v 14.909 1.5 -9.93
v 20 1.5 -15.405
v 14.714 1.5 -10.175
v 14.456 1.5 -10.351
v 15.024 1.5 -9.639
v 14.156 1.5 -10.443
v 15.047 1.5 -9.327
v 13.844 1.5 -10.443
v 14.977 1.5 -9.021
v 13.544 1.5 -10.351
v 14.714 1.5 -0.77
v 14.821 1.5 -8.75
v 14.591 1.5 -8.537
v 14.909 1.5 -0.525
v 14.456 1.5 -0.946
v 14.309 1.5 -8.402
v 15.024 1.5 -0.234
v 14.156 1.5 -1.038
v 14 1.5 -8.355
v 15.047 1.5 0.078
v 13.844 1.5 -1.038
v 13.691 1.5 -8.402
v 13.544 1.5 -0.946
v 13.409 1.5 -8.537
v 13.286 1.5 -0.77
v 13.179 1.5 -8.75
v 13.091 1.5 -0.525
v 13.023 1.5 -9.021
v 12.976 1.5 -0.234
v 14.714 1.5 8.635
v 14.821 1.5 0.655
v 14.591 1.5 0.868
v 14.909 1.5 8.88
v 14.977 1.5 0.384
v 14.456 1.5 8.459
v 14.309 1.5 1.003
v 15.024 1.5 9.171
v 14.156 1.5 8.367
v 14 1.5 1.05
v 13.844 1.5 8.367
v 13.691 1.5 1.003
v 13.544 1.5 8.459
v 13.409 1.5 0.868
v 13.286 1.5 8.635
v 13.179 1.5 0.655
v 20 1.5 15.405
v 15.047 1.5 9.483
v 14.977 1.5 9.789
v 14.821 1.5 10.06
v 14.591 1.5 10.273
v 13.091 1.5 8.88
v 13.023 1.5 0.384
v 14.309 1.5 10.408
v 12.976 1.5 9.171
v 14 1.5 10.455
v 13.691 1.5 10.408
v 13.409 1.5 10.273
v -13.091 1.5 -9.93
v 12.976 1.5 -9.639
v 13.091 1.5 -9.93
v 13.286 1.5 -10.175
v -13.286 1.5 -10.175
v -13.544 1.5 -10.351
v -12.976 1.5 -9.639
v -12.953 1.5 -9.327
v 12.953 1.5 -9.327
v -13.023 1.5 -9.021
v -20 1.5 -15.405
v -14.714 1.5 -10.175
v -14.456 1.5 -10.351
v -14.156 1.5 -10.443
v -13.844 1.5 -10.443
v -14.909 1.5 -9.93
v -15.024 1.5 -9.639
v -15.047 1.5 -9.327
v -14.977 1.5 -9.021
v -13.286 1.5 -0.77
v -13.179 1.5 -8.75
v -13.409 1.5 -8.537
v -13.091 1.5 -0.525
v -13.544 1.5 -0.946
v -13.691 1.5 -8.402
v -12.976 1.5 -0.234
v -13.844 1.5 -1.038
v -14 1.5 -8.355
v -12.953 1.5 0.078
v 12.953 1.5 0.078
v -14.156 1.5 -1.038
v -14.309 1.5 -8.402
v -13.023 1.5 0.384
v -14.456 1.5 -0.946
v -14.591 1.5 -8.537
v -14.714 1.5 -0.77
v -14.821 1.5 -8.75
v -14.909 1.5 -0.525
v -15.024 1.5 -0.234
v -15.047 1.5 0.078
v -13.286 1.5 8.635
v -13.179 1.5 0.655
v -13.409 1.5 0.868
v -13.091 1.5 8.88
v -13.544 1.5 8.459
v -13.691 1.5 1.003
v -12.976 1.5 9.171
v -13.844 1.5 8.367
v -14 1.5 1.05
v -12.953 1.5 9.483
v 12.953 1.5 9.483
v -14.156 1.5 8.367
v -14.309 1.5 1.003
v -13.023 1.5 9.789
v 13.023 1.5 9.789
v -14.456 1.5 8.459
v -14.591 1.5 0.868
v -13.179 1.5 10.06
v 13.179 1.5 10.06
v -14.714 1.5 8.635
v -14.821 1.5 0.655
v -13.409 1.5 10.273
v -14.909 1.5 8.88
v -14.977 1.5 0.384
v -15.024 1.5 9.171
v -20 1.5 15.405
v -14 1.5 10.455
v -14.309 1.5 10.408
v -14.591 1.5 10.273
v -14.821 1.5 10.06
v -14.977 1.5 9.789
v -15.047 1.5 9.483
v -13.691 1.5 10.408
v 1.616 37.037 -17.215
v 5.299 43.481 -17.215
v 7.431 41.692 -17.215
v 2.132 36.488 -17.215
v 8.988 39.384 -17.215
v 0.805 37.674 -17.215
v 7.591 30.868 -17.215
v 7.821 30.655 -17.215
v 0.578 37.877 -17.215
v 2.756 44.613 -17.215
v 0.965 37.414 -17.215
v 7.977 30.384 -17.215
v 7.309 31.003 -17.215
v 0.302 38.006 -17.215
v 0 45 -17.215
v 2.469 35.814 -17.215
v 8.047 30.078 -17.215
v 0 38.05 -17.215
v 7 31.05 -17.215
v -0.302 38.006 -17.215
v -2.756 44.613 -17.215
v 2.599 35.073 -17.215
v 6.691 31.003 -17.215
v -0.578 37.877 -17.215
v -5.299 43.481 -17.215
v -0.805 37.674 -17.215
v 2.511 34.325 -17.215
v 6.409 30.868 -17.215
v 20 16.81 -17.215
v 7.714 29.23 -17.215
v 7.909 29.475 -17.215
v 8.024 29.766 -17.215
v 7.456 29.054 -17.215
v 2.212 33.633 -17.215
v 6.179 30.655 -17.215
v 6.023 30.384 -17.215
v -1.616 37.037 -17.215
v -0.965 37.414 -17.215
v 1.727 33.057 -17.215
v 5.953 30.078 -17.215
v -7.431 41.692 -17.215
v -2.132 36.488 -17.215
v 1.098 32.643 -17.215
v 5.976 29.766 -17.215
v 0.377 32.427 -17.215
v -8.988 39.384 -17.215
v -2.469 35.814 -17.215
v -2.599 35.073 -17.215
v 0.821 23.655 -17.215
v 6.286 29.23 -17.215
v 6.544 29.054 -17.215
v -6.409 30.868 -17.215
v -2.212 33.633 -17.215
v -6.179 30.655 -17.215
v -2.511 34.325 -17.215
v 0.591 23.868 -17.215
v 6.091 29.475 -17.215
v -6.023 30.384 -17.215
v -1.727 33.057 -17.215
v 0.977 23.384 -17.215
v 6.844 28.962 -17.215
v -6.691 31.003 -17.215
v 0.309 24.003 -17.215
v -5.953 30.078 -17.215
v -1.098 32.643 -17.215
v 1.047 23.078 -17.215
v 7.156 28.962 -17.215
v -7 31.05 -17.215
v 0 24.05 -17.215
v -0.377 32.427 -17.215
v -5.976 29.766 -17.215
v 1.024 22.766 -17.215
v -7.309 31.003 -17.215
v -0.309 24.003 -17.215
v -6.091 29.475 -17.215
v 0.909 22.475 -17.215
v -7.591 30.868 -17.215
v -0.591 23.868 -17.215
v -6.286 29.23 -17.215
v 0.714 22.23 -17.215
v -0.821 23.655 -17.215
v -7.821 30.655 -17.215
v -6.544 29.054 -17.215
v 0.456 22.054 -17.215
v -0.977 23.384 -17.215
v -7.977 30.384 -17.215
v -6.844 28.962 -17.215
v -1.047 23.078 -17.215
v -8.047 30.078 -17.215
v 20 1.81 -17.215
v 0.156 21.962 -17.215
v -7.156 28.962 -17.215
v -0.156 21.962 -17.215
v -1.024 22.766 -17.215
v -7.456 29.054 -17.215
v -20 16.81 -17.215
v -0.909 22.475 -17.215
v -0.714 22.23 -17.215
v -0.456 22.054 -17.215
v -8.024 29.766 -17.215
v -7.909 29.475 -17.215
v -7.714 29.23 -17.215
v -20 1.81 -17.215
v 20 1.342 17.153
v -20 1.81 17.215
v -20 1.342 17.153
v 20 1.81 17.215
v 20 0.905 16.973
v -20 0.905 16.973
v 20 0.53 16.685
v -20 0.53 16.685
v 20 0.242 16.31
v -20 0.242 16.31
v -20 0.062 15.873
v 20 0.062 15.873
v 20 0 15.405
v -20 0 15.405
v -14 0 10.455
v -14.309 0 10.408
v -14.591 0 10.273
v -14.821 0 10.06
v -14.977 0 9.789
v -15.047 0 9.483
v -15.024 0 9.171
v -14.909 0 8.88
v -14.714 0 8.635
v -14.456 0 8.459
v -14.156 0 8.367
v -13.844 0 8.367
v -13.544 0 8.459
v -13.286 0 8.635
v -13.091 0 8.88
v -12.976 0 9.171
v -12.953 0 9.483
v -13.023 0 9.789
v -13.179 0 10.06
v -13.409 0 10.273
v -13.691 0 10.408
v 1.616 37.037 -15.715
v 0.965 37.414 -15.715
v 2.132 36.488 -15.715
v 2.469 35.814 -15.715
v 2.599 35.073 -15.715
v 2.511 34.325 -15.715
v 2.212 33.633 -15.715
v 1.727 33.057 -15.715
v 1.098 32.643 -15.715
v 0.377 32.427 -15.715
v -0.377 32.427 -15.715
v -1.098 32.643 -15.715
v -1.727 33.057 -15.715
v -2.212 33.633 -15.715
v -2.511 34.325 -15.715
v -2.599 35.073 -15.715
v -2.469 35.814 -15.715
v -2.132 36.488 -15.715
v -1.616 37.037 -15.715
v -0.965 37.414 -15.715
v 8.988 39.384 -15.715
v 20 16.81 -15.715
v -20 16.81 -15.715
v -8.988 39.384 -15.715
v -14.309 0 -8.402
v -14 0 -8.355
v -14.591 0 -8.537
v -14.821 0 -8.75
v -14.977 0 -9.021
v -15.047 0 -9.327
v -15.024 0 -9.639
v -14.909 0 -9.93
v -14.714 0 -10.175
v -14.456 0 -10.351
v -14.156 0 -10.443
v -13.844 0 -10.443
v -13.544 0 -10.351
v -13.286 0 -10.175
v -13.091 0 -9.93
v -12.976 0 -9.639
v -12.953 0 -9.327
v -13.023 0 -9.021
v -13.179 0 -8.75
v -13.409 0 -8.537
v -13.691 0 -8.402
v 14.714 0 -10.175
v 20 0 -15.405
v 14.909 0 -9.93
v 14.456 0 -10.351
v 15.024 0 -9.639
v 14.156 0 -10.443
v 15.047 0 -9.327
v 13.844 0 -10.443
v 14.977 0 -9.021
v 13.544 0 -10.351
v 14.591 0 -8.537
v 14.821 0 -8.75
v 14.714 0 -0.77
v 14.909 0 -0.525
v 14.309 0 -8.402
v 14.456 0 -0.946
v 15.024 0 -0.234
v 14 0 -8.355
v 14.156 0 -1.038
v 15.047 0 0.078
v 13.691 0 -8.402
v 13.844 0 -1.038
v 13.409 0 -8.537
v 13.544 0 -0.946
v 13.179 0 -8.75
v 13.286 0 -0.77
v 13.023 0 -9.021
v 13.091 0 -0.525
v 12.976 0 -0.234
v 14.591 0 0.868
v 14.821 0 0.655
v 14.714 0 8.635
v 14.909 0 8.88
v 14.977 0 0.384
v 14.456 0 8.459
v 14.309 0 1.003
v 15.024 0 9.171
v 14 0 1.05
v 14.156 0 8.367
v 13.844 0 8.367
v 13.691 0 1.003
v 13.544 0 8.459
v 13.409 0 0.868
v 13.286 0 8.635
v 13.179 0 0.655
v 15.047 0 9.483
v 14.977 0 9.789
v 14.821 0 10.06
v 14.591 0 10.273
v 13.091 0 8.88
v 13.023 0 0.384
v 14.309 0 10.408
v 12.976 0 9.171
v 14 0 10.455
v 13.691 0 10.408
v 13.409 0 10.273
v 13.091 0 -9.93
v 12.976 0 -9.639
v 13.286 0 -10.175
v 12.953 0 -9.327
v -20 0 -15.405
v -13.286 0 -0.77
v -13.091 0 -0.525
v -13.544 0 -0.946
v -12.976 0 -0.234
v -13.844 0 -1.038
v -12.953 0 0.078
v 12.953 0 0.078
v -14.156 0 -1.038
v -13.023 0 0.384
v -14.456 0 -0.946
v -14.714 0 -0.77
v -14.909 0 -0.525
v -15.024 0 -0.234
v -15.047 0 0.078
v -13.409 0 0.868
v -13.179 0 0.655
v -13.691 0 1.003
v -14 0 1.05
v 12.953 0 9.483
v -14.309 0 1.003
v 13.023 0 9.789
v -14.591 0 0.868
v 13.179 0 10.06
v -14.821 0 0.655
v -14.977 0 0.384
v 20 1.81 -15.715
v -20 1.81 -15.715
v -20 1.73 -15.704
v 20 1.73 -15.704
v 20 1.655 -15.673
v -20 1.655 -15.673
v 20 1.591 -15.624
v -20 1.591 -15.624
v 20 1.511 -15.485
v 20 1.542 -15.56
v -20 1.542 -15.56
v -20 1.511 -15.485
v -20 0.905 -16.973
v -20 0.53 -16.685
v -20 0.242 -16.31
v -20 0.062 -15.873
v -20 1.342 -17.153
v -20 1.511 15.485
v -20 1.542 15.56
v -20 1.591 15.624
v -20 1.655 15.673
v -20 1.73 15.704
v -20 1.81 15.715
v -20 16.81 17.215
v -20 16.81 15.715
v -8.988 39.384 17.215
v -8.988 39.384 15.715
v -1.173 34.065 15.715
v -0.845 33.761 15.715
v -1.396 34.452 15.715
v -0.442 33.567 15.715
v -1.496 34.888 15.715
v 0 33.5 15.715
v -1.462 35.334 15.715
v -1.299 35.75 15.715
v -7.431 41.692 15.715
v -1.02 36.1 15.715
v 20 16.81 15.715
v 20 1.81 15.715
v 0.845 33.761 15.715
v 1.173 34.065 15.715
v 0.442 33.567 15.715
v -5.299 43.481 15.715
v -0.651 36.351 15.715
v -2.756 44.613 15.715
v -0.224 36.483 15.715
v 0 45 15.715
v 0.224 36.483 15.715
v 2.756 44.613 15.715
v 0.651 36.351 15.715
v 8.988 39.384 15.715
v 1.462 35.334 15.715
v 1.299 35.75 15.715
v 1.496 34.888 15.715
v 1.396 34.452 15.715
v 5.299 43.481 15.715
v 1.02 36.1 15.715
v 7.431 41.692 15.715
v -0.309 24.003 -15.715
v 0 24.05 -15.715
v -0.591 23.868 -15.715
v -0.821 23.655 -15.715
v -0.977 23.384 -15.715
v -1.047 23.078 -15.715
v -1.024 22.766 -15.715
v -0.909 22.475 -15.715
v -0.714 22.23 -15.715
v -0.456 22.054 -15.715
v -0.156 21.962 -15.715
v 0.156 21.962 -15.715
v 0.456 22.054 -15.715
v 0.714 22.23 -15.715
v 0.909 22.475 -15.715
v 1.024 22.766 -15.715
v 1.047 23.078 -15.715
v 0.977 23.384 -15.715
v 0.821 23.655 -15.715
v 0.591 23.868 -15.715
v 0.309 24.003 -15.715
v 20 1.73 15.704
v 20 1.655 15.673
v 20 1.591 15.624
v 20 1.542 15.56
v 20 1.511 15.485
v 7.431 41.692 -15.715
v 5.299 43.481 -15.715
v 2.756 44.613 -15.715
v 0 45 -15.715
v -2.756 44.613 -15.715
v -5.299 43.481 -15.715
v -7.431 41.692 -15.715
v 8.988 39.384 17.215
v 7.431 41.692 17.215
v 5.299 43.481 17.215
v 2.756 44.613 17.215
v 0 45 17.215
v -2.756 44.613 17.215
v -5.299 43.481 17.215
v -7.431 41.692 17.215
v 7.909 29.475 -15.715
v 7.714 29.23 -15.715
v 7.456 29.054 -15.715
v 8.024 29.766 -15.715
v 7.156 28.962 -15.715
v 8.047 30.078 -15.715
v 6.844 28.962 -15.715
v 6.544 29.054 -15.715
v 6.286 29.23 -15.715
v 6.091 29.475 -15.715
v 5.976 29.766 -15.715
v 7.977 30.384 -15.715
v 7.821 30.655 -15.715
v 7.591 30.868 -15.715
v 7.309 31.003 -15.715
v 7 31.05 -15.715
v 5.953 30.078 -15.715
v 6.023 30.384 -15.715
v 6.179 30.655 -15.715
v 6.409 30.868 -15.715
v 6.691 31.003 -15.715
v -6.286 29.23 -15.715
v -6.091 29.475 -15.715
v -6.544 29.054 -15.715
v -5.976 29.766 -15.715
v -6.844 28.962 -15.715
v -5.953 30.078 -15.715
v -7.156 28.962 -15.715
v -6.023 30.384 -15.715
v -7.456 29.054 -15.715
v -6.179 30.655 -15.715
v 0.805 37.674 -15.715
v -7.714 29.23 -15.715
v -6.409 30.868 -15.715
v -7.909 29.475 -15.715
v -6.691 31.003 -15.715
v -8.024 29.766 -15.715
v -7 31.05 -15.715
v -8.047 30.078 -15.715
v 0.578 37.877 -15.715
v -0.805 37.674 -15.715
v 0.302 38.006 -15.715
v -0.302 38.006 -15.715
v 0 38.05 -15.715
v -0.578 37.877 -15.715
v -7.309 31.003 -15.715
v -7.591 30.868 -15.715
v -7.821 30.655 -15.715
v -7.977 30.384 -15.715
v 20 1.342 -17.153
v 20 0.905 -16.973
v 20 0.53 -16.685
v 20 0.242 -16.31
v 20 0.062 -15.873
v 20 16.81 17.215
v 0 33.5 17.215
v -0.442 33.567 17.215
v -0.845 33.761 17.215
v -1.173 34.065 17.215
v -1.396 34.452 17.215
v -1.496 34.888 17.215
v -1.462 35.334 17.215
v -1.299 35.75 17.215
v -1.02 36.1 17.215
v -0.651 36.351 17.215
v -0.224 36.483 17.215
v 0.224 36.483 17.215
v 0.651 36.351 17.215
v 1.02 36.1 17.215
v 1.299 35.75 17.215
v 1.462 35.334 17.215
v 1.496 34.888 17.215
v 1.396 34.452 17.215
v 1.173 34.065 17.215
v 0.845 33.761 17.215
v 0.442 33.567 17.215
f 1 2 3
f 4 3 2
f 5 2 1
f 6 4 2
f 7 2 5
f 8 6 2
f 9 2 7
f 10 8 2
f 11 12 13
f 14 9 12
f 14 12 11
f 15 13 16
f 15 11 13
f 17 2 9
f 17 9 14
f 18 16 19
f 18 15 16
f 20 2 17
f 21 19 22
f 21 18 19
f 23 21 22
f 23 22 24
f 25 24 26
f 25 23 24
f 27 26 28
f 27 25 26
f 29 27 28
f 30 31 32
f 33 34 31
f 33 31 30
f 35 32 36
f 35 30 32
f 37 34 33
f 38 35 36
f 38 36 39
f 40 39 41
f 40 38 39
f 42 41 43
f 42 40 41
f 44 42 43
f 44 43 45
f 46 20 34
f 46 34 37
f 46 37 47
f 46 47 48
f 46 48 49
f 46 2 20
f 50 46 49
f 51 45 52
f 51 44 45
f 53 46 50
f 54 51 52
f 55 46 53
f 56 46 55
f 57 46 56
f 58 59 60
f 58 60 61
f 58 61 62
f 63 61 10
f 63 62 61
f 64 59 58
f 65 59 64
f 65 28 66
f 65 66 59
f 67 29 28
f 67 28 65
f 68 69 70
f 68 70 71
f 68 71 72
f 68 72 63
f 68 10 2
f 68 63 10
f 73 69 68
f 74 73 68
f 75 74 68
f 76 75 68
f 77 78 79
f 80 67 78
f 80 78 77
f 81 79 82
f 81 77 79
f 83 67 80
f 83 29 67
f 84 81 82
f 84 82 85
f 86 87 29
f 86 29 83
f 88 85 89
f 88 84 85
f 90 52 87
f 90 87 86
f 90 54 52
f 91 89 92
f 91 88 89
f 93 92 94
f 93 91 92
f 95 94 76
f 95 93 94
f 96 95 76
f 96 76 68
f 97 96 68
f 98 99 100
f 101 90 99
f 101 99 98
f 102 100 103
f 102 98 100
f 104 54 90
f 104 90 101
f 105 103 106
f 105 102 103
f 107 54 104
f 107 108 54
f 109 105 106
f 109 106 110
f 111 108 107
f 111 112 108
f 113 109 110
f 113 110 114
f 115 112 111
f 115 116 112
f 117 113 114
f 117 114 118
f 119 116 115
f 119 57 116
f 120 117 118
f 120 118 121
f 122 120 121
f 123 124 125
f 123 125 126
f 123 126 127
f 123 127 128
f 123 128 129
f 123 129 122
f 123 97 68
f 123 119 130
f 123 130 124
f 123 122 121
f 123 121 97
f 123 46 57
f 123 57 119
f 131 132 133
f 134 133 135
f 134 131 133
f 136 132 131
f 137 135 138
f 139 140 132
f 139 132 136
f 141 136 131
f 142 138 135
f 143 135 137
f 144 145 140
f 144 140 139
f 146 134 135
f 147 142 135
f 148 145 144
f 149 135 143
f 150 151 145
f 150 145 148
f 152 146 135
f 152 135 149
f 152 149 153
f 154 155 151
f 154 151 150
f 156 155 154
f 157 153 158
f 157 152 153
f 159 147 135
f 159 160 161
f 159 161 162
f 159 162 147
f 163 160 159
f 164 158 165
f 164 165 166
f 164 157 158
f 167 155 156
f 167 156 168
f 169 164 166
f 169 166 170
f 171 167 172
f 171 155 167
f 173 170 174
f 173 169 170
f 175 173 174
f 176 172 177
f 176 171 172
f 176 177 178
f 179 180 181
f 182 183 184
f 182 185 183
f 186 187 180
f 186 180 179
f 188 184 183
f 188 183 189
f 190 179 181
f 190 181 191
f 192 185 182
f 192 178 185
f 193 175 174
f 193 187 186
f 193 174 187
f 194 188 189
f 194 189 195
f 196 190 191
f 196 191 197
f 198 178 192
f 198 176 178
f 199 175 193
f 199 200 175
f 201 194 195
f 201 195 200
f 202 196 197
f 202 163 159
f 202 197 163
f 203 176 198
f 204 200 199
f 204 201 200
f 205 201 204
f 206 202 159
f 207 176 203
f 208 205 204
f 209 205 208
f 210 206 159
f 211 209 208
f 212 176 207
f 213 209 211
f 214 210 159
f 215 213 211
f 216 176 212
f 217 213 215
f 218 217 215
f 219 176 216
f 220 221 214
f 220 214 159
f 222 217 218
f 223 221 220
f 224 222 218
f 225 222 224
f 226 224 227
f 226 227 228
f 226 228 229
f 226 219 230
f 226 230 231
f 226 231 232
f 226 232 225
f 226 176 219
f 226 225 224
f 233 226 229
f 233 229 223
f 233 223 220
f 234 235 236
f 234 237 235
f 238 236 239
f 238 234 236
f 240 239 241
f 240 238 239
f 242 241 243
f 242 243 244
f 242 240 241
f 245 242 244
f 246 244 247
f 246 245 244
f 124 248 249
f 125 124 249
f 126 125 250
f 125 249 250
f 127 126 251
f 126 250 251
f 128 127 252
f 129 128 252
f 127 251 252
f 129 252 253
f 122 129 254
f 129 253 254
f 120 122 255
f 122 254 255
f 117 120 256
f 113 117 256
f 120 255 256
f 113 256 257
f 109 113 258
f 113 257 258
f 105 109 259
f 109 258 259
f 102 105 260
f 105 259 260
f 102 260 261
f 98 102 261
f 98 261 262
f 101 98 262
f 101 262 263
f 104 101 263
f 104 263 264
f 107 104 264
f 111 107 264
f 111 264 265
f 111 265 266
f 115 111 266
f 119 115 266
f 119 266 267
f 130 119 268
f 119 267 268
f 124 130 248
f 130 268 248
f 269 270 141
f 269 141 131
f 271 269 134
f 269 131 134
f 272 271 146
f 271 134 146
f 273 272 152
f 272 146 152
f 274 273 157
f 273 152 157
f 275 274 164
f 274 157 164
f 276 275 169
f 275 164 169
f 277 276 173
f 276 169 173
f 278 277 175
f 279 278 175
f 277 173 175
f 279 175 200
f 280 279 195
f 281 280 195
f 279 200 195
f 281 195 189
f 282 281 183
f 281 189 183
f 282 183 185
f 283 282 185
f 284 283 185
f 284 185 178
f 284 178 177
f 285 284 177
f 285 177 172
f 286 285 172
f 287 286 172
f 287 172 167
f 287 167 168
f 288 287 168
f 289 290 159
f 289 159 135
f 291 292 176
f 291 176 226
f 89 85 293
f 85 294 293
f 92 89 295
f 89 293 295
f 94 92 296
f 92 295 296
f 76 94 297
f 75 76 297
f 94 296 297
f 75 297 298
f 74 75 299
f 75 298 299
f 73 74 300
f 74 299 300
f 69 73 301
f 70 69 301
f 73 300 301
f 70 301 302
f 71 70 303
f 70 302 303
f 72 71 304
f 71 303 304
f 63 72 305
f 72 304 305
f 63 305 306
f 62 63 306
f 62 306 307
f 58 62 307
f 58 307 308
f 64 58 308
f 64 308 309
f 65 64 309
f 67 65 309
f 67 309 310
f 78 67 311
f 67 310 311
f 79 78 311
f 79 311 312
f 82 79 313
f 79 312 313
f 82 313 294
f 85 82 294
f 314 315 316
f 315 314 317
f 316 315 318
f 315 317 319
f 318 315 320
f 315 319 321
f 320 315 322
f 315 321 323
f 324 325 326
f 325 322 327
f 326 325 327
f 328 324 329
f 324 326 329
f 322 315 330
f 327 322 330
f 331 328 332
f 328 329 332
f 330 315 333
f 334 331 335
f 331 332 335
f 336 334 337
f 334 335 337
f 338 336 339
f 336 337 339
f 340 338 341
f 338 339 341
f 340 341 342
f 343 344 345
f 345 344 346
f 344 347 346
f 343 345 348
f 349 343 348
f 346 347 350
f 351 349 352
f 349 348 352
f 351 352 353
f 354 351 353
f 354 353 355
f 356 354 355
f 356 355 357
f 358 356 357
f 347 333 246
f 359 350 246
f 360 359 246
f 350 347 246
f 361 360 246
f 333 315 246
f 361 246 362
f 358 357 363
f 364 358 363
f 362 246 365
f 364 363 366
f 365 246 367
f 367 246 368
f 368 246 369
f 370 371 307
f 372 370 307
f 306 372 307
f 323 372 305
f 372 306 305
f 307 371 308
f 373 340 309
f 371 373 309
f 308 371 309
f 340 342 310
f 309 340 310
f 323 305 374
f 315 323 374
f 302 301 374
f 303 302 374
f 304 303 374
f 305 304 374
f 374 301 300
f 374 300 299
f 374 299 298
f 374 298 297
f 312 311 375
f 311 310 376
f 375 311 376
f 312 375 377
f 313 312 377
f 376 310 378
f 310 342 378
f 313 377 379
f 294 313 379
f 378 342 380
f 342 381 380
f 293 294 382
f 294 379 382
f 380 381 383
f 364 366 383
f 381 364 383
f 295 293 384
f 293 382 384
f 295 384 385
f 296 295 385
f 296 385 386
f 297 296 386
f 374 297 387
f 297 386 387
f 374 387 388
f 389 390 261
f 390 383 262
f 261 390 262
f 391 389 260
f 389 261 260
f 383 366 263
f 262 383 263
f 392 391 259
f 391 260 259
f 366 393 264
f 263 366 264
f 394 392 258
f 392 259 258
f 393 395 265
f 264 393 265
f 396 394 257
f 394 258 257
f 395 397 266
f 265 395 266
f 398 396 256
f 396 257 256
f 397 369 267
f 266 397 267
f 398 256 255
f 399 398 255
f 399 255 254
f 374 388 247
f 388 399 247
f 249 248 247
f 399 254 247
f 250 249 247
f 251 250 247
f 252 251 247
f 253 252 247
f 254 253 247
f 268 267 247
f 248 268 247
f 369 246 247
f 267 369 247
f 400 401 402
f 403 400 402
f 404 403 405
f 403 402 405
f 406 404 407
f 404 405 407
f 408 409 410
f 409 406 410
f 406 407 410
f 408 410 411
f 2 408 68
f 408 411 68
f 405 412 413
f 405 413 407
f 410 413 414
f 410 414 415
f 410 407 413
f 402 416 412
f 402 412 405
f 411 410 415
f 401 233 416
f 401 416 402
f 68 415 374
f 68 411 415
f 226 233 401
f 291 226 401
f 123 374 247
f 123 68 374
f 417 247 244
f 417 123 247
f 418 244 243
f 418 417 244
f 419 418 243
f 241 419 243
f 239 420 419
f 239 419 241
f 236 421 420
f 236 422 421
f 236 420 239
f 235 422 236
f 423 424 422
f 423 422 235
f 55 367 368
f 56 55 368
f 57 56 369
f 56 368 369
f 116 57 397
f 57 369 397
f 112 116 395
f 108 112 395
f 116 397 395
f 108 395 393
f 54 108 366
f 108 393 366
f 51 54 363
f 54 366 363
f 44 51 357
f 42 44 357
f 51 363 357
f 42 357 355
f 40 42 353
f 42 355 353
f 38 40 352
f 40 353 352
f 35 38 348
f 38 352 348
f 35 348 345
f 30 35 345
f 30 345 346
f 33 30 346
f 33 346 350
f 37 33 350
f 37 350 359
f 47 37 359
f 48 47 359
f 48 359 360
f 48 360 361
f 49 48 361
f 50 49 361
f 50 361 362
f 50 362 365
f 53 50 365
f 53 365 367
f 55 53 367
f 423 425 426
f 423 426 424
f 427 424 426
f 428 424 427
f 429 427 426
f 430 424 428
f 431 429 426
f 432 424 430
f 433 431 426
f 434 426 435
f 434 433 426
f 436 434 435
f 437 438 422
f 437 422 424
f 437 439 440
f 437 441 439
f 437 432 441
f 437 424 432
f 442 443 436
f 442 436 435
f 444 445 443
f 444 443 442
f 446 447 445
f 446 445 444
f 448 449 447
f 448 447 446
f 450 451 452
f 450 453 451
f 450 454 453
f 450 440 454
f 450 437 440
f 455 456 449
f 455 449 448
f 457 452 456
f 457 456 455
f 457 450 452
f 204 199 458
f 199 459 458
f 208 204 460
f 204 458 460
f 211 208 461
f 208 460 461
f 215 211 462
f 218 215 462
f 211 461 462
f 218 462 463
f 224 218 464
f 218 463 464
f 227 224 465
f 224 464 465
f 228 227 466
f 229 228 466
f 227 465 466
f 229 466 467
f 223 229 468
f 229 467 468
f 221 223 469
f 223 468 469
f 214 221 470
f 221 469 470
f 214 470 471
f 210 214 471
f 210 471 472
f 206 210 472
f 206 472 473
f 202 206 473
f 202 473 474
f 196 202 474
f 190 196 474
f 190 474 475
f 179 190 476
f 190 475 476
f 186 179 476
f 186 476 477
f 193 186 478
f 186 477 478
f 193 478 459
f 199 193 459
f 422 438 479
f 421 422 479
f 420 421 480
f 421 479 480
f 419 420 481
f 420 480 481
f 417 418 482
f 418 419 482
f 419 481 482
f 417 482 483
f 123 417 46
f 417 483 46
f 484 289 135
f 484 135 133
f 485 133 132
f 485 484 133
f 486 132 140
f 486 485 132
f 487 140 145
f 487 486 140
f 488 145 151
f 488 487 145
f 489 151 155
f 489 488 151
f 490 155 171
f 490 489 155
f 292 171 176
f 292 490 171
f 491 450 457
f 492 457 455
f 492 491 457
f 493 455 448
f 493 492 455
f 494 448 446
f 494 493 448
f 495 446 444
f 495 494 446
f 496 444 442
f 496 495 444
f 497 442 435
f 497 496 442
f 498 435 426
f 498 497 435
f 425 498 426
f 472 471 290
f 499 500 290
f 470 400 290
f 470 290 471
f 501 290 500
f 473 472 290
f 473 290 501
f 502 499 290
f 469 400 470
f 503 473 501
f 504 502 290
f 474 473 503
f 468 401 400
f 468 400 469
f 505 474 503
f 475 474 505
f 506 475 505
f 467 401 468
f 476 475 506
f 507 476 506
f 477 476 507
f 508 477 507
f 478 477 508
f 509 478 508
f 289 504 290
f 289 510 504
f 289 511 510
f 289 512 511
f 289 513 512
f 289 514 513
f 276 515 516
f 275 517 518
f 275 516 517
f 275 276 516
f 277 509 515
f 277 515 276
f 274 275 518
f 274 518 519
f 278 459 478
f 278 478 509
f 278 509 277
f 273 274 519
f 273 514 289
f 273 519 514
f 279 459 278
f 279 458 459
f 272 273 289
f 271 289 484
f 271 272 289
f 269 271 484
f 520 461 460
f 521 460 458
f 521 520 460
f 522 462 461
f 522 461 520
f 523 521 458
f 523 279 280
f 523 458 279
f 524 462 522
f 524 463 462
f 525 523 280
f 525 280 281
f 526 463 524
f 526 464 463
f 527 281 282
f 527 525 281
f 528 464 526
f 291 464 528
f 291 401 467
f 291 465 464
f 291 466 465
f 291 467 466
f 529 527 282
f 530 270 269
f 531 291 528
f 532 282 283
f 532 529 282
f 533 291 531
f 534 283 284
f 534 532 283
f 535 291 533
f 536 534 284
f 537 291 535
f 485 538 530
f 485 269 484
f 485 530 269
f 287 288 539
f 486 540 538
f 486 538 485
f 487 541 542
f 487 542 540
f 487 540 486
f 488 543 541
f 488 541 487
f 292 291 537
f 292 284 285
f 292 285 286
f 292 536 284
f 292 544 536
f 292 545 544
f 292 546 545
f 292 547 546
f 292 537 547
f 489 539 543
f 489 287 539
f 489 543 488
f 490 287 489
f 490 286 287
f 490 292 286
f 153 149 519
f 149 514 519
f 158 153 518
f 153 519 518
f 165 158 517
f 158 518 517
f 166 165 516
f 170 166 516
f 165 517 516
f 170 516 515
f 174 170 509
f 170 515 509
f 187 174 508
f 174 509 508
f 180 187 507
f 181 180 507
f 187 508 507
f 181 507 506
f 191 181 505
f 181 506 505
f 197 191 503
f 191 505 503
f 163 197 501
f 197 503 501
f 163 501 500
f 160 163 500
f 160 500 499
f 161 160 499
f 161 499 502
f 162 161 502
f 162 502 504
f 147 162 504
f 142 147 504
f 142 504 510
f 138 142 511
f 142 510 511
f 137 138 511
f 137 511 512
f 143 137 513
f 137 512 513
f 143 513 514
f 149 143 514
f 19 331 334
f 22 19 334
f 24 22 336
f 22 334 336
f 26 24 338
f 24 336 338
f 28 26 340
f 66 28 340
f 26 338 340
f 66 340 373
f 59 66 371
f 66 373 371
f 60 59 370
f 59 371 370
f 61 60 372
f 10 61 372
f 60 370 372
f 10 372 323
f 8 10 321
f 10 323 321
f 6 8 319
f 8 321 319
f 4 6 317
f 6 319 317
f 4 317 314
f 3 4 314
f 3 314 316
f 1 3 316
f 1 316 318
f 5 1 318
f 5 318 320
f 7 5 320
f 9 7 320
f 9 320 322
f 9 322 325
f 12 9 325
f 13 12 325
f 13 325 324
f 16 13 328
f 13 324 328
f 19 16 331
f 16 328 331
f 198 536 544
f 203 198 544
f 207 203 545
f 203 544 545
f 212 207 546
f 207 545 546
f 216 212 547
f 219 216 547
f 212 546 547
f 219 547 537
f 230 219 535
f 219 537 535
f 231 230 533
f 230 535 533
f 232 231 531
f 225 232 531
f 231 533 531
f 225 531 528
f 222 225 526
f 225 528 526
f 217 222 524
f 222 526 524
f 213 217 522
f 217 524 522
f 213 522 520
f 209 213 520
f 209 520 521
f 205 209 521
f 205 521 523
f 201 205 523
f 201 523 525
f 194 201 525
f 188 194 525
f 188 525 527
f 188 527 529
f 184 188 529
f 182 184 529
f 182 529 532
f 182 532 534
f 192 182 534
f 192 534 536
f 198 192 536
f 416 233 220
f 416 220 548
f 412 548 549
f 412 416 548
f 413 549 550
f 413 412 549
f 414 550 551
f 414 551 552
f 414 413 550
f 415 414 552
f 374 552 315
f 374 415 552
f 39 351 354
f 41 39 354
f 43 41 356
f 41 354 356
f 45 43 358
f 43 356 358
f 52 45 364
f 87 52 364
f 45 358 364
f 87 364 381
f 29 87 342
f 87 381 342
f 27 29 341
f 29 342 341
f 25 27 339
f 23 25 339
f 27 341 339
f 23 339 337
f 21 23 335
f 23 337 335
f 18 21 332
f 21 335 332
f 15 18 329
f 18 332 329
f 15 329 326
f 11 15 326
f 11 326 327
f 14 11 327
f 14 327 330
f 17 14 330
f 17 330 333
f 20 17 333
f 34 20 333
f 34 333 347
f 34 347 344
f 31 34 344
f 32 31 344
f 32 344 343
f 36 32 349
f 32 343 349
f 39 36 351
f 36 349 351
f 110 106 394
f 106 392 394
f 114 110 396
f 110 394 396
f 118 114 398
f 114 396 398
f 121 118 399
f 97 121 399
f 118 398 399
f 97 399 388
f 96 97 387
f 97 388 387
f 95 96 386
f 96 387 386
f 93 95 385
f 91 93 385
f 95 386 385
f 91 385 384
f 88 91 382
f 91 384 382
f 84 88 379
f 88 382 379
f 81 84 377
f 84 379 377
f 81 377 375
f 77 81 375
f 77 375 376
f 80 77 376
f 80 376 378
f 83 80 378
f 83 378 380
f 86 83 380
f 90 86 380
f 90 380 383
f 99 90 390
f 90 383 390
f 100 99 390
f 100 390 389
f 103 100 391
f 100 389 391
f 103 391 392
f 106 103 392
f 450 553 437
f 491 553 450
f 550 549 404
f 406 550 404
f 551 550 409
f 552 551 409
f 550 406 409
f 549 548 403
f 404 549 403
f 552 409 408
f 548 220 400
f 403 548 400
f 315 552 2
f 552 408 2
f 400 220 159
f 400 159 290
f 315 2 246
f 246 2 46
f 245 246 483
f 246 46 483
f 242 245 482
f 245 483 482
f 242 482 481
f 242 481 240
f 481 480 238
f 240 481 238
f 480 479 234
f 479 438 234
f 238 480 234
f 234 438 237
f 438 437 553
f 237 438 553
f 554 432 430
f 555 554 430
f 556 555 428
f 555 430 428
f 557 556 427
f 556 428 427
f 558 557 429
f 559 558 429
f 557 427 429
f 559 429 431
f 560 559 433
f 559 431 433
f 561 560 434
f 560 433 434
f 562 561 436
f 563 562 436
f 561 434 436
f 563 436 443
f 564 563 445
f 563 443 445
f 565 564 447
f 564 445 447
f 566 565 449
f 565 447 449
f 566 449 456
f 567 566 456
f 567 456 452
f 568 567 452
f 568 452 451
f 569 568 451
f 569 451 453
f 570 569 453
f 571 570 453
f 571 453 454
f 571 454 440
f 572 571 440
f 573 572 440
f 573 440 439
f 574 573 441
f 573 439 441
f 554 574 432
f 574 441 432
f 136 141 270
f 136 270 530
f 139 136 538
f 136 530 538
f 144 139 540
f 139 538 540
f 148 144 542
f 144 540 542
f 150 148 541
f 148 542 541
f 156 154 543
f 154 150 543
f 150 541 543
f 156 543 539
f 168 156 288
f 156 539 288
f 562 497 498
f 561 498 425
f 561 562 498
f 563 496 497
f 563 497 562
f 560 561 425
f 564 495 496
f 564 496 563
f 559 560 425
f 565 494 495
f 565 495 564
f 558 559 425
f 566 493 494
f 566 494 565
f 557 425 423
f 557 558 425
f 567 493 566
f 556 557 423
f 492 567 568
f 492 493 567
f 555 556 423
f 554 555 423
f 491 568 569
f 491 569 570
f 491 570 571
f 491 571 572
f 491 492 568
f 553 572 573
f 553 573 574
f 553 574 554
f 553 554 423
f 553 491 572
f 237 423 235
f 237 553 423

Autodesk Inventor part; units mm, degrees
ref_plane "YZ Plane" through (0, 0, 0) normal (1, 0, 0) x (0, 1, 0)
ref_plane "XZ Plane" through (0, 0, 0) normal (0, 1, 0) x (-1, 0, 0)
ref_plane "XY Plane" through (0, 0, 0) normal (0, 0, 1) x (1, 0, 0)
sketch "Sketch1" plane through (0, 0, 0) normal (0, 1, 0) x (-1, 0, 0)
  line L0 (20, -15.715) -> (-20, -15.715)
  line L1 (-20, -15.715) -> (-20, 15.715)
  line L2 (-20, 15.715) -> (20, 15.715)
  line L3 (20, 15.715) -> (20, -15.715)
  point P0 (0, 0)
  dimension "d0" = 40
  dimension "d1" = 20
  dimension "d2" = 31.43
  dimension "d3" = 15.715
extrude "Plate1" add sketch "Sketch1" along normal blind 1.5
sketch "Sketch2" plane through (20, 0, 17.215) normal (0, 0, -1) x (-1, 0, 0)
  line L0 (40, 0) -> (0, 0)
  line L1 (0, 0) -> (0, 45)
  line L2 (0, 45) -> (40, 45)
  line L3 (40, 45) -> (40, 0)
edge flange "Flange1" height 45 angle 90 thickness 1.5 bend radius 0.31 thickness toward (0, 0, -1) relief tear relief width 1.5 relief depth 0.75 edges at (0, 1.5, 15.715) wall of the first edge with corners at (-20, 0, 17.215) (20, 0, 17.215) (20, 45, 17.215) (-20, 45, 17.215)
bend "Bend1"
corner "Corner1"
sketch "Sketch3" plane through (-20, 0, -17.215) normal (0, 0, 1) x (1, 0, 0)
  line L0 (40, 0) -> (0, 0)
  line L1 (0, 0) -> (0, 45)
  line L2 (0, 45) -> (40, 45)
  line L3 (40, 45) -> (40, 0)
edge flange "Flange2" height 45 angle 90 thickness 1.5 bend radius 0.31 thickness toward (0, 0, 1) relief tear relief width 1.5 relief depth 0.75 edges at (0, 1.5, -15.715) wall of the first edge with corners at (20, 0, -17.215) (-20, 0, -17.215) (-20, 45, -17.215) (20, 45, -17.215)
bend "Bend2"
corner "Corner2"
sketch "Sketch4" plane through (-20, 45, 17.215) normal (0, 0, 1) x (1, 0, 0)
  line L0 (0, -43.19) -> (0, 0) projected
  line L1 (0, 0) -> (40, 0) projected
  line L2 (40, 0) -> (40, -43.19) projected
  line L3 (0, -43.19) -> (40, -43.19) projected
  arc A0 (28.9876, -5.6156) -> (11.0124, -5.6156) centre (20, -10) ccw
  line L4 (0, -38.19) -> (40, -38.19)
  line L5 (40, -38.19) -> (40, -28.19)
  line L6 (40, -28.19) -> (0, -28.19)
  line L7 (0, -28.19) -> (0, -38.19)
  line L8 (40, -28.19) -> (28.9876, -5.6156)
  line L9 (11.0124, -5.6156) -> (0, -28.19)
  point P0 (0, -28.19)
  point P1 (20, 0)
  point P2 (40, -28.19)
  dimension "d50" = 10
  dimension "d51" = 20
  dimension "d52" = 20
  dimension "d53" = 38.19
  dimension "d54" = 10
  dimension "d55" = 40
  dimension "d56" = 40
extrude "Extrusion1" cut sketch "Sketch4" against normal blind 50 contours L0 L1 A0 L9 | L8 A0 L1 L2
sketch "Sketch5" plane through (20, 1.81, -17.215) normal (0, 0, -1) x (-1, 0, 0)
  arc A0 (20, 38.19) -> (20, 38.19) centre (20, 28.19) ccw projected
  circle A1 centre (20, 35.19) radius 1.05
  circle A2 centre (13, 28.19) radius 1.05
  circle A3 centre (20, 21.19) radius 1.05
  circle A4 centre (27, 28.19) radius 1.05
  point P0 (20, -1.81)
  dimension "d36" = 7
  dimension "d37" = 0
  dimension "d38" = 2.1
  dimension "d41" = 360
hole "Hole1" at (7, 30, -17.215) at (0, 23, -17.215) at (-7, 30, -17.215) at (0, 37, -17.215) direction (0, 0, 1) diameter 2.1 depth 1.5
sketch "Sketch6" plane through (-20, 1.81, 17.215) normal (0, 0, 1) x (1, 0, 0)
  arc A0 (28.9876, 37.5744) -> (11.0124, 37.5744) centre (20, 33.19) ccw projected
  point P0 (20, -1.81)
hole "Hole2" at (0, 35, 17.215) direction (0, 0, -1) diameter 3 depth 1.5
sketch "Sketch7" plane through (-20, 1.81, -15.715) normal (0, 0, 1) x (1, 0, 0)
  arc A0 (28.9876, 37.5744) -> (11.0124, 37.5744) centre (20, 33.19) ccw projected
  point P0 (20, -1.81)
hole "Hole3" at (0, 35, -15.715) direction (0, 0, -1) diameter 5.2 depth 1.5 clearance for "Hex Head Bolt" size "M5" standard "Ansi Metric M Profile"
sketch "Sketch8" plane through (0, 1.5, 0) normal (0, 1, 0) x (1, 0, 0)
  line L0 (20, 15.405) -> (20, -15.405) projected
  line L1 (20, -15.715) -> (-20, -15.715) projected
  line L2 (-20, -15.405) -> (20, -15.405) projected
  line L3 (20, 15.405) -> (-20, 15.405) projected
  point P0 (0, 0)
  point P1 (14, -9.405)
  point P2 (-14, -9.405)
  point P3 (14, 0)
  point P4 (-14, 0)
  point P5 (14, 9.405)
  point P6 (-14, 9.405)
  dimension "d71" = 6
  dimension "d73" = 6
  dimension "d76" = 28
  dimension "d79" = 9.405
hole "Hole4" at (14, 1.5, 9.405) at (-14, 1.5, 9.405) at (14, 1.5, 0) at (-14, 1.5, 0) at (14, 1.5, -9.405) at (-14, 1.5, -9.405) direction (0, -1, 0) diameter 2.1 depth 1.5
equation "\"d48\" = Thickness"
equation "\"d62\" = Thickness"
equation "\"d69\" = Thickness"
equation "\"d87\" = Thickness"
equation "\"d4\" = Thickness"
equation "\"d5\" = BendReliefWidth"
equation "\"d6\" = BendReliefDepth"
equation "\"d7\" = MinimumRemnant"
equation "\"d8\" = TransitionRadius"
equation "\"d11\" = BendRadius"
equation "\"d12\" = CornerReliefSize"
equation "\"d13\" = GapSize"
equation "\"d14\" = JacobiRadiusSize"
equation "\"d15\" = BendReliefWidth"
equation "\"d16\" = BendReliefDepth"
equation "\"d17\" = MinimumRemnant"
equation "\"d18\" = TransitionRadius"
equation "\"d21\" = BendRadius"
equation "\"d22\" = CornerReliefSize"
equation "\"d23\" = GapSize"
equation "\"d24\" = JacobiRadiusSize"
equation "\"BendReliefWidth\" = Thickness"
equation "\"BendReliefDepth\" = 0.5 * Thickness"
equation "\"CornerReliefSize\" = 4 * Thickness"
equation "\"MinimumRemnant\" = 2 * Thickness"
equation "\"TransitionRadius\" = BendRadius"
equation "\"JacobiRadiusSize\" = BendRadius"
equation "\"GapSize\" = Thickness"
equation "\"Thickness\" = 1.5"
equation "\"BendRadius\" = 0.31"
properties part number "axis_12_bottom_frame(top)" material "Aluminum 6061-AHC"
